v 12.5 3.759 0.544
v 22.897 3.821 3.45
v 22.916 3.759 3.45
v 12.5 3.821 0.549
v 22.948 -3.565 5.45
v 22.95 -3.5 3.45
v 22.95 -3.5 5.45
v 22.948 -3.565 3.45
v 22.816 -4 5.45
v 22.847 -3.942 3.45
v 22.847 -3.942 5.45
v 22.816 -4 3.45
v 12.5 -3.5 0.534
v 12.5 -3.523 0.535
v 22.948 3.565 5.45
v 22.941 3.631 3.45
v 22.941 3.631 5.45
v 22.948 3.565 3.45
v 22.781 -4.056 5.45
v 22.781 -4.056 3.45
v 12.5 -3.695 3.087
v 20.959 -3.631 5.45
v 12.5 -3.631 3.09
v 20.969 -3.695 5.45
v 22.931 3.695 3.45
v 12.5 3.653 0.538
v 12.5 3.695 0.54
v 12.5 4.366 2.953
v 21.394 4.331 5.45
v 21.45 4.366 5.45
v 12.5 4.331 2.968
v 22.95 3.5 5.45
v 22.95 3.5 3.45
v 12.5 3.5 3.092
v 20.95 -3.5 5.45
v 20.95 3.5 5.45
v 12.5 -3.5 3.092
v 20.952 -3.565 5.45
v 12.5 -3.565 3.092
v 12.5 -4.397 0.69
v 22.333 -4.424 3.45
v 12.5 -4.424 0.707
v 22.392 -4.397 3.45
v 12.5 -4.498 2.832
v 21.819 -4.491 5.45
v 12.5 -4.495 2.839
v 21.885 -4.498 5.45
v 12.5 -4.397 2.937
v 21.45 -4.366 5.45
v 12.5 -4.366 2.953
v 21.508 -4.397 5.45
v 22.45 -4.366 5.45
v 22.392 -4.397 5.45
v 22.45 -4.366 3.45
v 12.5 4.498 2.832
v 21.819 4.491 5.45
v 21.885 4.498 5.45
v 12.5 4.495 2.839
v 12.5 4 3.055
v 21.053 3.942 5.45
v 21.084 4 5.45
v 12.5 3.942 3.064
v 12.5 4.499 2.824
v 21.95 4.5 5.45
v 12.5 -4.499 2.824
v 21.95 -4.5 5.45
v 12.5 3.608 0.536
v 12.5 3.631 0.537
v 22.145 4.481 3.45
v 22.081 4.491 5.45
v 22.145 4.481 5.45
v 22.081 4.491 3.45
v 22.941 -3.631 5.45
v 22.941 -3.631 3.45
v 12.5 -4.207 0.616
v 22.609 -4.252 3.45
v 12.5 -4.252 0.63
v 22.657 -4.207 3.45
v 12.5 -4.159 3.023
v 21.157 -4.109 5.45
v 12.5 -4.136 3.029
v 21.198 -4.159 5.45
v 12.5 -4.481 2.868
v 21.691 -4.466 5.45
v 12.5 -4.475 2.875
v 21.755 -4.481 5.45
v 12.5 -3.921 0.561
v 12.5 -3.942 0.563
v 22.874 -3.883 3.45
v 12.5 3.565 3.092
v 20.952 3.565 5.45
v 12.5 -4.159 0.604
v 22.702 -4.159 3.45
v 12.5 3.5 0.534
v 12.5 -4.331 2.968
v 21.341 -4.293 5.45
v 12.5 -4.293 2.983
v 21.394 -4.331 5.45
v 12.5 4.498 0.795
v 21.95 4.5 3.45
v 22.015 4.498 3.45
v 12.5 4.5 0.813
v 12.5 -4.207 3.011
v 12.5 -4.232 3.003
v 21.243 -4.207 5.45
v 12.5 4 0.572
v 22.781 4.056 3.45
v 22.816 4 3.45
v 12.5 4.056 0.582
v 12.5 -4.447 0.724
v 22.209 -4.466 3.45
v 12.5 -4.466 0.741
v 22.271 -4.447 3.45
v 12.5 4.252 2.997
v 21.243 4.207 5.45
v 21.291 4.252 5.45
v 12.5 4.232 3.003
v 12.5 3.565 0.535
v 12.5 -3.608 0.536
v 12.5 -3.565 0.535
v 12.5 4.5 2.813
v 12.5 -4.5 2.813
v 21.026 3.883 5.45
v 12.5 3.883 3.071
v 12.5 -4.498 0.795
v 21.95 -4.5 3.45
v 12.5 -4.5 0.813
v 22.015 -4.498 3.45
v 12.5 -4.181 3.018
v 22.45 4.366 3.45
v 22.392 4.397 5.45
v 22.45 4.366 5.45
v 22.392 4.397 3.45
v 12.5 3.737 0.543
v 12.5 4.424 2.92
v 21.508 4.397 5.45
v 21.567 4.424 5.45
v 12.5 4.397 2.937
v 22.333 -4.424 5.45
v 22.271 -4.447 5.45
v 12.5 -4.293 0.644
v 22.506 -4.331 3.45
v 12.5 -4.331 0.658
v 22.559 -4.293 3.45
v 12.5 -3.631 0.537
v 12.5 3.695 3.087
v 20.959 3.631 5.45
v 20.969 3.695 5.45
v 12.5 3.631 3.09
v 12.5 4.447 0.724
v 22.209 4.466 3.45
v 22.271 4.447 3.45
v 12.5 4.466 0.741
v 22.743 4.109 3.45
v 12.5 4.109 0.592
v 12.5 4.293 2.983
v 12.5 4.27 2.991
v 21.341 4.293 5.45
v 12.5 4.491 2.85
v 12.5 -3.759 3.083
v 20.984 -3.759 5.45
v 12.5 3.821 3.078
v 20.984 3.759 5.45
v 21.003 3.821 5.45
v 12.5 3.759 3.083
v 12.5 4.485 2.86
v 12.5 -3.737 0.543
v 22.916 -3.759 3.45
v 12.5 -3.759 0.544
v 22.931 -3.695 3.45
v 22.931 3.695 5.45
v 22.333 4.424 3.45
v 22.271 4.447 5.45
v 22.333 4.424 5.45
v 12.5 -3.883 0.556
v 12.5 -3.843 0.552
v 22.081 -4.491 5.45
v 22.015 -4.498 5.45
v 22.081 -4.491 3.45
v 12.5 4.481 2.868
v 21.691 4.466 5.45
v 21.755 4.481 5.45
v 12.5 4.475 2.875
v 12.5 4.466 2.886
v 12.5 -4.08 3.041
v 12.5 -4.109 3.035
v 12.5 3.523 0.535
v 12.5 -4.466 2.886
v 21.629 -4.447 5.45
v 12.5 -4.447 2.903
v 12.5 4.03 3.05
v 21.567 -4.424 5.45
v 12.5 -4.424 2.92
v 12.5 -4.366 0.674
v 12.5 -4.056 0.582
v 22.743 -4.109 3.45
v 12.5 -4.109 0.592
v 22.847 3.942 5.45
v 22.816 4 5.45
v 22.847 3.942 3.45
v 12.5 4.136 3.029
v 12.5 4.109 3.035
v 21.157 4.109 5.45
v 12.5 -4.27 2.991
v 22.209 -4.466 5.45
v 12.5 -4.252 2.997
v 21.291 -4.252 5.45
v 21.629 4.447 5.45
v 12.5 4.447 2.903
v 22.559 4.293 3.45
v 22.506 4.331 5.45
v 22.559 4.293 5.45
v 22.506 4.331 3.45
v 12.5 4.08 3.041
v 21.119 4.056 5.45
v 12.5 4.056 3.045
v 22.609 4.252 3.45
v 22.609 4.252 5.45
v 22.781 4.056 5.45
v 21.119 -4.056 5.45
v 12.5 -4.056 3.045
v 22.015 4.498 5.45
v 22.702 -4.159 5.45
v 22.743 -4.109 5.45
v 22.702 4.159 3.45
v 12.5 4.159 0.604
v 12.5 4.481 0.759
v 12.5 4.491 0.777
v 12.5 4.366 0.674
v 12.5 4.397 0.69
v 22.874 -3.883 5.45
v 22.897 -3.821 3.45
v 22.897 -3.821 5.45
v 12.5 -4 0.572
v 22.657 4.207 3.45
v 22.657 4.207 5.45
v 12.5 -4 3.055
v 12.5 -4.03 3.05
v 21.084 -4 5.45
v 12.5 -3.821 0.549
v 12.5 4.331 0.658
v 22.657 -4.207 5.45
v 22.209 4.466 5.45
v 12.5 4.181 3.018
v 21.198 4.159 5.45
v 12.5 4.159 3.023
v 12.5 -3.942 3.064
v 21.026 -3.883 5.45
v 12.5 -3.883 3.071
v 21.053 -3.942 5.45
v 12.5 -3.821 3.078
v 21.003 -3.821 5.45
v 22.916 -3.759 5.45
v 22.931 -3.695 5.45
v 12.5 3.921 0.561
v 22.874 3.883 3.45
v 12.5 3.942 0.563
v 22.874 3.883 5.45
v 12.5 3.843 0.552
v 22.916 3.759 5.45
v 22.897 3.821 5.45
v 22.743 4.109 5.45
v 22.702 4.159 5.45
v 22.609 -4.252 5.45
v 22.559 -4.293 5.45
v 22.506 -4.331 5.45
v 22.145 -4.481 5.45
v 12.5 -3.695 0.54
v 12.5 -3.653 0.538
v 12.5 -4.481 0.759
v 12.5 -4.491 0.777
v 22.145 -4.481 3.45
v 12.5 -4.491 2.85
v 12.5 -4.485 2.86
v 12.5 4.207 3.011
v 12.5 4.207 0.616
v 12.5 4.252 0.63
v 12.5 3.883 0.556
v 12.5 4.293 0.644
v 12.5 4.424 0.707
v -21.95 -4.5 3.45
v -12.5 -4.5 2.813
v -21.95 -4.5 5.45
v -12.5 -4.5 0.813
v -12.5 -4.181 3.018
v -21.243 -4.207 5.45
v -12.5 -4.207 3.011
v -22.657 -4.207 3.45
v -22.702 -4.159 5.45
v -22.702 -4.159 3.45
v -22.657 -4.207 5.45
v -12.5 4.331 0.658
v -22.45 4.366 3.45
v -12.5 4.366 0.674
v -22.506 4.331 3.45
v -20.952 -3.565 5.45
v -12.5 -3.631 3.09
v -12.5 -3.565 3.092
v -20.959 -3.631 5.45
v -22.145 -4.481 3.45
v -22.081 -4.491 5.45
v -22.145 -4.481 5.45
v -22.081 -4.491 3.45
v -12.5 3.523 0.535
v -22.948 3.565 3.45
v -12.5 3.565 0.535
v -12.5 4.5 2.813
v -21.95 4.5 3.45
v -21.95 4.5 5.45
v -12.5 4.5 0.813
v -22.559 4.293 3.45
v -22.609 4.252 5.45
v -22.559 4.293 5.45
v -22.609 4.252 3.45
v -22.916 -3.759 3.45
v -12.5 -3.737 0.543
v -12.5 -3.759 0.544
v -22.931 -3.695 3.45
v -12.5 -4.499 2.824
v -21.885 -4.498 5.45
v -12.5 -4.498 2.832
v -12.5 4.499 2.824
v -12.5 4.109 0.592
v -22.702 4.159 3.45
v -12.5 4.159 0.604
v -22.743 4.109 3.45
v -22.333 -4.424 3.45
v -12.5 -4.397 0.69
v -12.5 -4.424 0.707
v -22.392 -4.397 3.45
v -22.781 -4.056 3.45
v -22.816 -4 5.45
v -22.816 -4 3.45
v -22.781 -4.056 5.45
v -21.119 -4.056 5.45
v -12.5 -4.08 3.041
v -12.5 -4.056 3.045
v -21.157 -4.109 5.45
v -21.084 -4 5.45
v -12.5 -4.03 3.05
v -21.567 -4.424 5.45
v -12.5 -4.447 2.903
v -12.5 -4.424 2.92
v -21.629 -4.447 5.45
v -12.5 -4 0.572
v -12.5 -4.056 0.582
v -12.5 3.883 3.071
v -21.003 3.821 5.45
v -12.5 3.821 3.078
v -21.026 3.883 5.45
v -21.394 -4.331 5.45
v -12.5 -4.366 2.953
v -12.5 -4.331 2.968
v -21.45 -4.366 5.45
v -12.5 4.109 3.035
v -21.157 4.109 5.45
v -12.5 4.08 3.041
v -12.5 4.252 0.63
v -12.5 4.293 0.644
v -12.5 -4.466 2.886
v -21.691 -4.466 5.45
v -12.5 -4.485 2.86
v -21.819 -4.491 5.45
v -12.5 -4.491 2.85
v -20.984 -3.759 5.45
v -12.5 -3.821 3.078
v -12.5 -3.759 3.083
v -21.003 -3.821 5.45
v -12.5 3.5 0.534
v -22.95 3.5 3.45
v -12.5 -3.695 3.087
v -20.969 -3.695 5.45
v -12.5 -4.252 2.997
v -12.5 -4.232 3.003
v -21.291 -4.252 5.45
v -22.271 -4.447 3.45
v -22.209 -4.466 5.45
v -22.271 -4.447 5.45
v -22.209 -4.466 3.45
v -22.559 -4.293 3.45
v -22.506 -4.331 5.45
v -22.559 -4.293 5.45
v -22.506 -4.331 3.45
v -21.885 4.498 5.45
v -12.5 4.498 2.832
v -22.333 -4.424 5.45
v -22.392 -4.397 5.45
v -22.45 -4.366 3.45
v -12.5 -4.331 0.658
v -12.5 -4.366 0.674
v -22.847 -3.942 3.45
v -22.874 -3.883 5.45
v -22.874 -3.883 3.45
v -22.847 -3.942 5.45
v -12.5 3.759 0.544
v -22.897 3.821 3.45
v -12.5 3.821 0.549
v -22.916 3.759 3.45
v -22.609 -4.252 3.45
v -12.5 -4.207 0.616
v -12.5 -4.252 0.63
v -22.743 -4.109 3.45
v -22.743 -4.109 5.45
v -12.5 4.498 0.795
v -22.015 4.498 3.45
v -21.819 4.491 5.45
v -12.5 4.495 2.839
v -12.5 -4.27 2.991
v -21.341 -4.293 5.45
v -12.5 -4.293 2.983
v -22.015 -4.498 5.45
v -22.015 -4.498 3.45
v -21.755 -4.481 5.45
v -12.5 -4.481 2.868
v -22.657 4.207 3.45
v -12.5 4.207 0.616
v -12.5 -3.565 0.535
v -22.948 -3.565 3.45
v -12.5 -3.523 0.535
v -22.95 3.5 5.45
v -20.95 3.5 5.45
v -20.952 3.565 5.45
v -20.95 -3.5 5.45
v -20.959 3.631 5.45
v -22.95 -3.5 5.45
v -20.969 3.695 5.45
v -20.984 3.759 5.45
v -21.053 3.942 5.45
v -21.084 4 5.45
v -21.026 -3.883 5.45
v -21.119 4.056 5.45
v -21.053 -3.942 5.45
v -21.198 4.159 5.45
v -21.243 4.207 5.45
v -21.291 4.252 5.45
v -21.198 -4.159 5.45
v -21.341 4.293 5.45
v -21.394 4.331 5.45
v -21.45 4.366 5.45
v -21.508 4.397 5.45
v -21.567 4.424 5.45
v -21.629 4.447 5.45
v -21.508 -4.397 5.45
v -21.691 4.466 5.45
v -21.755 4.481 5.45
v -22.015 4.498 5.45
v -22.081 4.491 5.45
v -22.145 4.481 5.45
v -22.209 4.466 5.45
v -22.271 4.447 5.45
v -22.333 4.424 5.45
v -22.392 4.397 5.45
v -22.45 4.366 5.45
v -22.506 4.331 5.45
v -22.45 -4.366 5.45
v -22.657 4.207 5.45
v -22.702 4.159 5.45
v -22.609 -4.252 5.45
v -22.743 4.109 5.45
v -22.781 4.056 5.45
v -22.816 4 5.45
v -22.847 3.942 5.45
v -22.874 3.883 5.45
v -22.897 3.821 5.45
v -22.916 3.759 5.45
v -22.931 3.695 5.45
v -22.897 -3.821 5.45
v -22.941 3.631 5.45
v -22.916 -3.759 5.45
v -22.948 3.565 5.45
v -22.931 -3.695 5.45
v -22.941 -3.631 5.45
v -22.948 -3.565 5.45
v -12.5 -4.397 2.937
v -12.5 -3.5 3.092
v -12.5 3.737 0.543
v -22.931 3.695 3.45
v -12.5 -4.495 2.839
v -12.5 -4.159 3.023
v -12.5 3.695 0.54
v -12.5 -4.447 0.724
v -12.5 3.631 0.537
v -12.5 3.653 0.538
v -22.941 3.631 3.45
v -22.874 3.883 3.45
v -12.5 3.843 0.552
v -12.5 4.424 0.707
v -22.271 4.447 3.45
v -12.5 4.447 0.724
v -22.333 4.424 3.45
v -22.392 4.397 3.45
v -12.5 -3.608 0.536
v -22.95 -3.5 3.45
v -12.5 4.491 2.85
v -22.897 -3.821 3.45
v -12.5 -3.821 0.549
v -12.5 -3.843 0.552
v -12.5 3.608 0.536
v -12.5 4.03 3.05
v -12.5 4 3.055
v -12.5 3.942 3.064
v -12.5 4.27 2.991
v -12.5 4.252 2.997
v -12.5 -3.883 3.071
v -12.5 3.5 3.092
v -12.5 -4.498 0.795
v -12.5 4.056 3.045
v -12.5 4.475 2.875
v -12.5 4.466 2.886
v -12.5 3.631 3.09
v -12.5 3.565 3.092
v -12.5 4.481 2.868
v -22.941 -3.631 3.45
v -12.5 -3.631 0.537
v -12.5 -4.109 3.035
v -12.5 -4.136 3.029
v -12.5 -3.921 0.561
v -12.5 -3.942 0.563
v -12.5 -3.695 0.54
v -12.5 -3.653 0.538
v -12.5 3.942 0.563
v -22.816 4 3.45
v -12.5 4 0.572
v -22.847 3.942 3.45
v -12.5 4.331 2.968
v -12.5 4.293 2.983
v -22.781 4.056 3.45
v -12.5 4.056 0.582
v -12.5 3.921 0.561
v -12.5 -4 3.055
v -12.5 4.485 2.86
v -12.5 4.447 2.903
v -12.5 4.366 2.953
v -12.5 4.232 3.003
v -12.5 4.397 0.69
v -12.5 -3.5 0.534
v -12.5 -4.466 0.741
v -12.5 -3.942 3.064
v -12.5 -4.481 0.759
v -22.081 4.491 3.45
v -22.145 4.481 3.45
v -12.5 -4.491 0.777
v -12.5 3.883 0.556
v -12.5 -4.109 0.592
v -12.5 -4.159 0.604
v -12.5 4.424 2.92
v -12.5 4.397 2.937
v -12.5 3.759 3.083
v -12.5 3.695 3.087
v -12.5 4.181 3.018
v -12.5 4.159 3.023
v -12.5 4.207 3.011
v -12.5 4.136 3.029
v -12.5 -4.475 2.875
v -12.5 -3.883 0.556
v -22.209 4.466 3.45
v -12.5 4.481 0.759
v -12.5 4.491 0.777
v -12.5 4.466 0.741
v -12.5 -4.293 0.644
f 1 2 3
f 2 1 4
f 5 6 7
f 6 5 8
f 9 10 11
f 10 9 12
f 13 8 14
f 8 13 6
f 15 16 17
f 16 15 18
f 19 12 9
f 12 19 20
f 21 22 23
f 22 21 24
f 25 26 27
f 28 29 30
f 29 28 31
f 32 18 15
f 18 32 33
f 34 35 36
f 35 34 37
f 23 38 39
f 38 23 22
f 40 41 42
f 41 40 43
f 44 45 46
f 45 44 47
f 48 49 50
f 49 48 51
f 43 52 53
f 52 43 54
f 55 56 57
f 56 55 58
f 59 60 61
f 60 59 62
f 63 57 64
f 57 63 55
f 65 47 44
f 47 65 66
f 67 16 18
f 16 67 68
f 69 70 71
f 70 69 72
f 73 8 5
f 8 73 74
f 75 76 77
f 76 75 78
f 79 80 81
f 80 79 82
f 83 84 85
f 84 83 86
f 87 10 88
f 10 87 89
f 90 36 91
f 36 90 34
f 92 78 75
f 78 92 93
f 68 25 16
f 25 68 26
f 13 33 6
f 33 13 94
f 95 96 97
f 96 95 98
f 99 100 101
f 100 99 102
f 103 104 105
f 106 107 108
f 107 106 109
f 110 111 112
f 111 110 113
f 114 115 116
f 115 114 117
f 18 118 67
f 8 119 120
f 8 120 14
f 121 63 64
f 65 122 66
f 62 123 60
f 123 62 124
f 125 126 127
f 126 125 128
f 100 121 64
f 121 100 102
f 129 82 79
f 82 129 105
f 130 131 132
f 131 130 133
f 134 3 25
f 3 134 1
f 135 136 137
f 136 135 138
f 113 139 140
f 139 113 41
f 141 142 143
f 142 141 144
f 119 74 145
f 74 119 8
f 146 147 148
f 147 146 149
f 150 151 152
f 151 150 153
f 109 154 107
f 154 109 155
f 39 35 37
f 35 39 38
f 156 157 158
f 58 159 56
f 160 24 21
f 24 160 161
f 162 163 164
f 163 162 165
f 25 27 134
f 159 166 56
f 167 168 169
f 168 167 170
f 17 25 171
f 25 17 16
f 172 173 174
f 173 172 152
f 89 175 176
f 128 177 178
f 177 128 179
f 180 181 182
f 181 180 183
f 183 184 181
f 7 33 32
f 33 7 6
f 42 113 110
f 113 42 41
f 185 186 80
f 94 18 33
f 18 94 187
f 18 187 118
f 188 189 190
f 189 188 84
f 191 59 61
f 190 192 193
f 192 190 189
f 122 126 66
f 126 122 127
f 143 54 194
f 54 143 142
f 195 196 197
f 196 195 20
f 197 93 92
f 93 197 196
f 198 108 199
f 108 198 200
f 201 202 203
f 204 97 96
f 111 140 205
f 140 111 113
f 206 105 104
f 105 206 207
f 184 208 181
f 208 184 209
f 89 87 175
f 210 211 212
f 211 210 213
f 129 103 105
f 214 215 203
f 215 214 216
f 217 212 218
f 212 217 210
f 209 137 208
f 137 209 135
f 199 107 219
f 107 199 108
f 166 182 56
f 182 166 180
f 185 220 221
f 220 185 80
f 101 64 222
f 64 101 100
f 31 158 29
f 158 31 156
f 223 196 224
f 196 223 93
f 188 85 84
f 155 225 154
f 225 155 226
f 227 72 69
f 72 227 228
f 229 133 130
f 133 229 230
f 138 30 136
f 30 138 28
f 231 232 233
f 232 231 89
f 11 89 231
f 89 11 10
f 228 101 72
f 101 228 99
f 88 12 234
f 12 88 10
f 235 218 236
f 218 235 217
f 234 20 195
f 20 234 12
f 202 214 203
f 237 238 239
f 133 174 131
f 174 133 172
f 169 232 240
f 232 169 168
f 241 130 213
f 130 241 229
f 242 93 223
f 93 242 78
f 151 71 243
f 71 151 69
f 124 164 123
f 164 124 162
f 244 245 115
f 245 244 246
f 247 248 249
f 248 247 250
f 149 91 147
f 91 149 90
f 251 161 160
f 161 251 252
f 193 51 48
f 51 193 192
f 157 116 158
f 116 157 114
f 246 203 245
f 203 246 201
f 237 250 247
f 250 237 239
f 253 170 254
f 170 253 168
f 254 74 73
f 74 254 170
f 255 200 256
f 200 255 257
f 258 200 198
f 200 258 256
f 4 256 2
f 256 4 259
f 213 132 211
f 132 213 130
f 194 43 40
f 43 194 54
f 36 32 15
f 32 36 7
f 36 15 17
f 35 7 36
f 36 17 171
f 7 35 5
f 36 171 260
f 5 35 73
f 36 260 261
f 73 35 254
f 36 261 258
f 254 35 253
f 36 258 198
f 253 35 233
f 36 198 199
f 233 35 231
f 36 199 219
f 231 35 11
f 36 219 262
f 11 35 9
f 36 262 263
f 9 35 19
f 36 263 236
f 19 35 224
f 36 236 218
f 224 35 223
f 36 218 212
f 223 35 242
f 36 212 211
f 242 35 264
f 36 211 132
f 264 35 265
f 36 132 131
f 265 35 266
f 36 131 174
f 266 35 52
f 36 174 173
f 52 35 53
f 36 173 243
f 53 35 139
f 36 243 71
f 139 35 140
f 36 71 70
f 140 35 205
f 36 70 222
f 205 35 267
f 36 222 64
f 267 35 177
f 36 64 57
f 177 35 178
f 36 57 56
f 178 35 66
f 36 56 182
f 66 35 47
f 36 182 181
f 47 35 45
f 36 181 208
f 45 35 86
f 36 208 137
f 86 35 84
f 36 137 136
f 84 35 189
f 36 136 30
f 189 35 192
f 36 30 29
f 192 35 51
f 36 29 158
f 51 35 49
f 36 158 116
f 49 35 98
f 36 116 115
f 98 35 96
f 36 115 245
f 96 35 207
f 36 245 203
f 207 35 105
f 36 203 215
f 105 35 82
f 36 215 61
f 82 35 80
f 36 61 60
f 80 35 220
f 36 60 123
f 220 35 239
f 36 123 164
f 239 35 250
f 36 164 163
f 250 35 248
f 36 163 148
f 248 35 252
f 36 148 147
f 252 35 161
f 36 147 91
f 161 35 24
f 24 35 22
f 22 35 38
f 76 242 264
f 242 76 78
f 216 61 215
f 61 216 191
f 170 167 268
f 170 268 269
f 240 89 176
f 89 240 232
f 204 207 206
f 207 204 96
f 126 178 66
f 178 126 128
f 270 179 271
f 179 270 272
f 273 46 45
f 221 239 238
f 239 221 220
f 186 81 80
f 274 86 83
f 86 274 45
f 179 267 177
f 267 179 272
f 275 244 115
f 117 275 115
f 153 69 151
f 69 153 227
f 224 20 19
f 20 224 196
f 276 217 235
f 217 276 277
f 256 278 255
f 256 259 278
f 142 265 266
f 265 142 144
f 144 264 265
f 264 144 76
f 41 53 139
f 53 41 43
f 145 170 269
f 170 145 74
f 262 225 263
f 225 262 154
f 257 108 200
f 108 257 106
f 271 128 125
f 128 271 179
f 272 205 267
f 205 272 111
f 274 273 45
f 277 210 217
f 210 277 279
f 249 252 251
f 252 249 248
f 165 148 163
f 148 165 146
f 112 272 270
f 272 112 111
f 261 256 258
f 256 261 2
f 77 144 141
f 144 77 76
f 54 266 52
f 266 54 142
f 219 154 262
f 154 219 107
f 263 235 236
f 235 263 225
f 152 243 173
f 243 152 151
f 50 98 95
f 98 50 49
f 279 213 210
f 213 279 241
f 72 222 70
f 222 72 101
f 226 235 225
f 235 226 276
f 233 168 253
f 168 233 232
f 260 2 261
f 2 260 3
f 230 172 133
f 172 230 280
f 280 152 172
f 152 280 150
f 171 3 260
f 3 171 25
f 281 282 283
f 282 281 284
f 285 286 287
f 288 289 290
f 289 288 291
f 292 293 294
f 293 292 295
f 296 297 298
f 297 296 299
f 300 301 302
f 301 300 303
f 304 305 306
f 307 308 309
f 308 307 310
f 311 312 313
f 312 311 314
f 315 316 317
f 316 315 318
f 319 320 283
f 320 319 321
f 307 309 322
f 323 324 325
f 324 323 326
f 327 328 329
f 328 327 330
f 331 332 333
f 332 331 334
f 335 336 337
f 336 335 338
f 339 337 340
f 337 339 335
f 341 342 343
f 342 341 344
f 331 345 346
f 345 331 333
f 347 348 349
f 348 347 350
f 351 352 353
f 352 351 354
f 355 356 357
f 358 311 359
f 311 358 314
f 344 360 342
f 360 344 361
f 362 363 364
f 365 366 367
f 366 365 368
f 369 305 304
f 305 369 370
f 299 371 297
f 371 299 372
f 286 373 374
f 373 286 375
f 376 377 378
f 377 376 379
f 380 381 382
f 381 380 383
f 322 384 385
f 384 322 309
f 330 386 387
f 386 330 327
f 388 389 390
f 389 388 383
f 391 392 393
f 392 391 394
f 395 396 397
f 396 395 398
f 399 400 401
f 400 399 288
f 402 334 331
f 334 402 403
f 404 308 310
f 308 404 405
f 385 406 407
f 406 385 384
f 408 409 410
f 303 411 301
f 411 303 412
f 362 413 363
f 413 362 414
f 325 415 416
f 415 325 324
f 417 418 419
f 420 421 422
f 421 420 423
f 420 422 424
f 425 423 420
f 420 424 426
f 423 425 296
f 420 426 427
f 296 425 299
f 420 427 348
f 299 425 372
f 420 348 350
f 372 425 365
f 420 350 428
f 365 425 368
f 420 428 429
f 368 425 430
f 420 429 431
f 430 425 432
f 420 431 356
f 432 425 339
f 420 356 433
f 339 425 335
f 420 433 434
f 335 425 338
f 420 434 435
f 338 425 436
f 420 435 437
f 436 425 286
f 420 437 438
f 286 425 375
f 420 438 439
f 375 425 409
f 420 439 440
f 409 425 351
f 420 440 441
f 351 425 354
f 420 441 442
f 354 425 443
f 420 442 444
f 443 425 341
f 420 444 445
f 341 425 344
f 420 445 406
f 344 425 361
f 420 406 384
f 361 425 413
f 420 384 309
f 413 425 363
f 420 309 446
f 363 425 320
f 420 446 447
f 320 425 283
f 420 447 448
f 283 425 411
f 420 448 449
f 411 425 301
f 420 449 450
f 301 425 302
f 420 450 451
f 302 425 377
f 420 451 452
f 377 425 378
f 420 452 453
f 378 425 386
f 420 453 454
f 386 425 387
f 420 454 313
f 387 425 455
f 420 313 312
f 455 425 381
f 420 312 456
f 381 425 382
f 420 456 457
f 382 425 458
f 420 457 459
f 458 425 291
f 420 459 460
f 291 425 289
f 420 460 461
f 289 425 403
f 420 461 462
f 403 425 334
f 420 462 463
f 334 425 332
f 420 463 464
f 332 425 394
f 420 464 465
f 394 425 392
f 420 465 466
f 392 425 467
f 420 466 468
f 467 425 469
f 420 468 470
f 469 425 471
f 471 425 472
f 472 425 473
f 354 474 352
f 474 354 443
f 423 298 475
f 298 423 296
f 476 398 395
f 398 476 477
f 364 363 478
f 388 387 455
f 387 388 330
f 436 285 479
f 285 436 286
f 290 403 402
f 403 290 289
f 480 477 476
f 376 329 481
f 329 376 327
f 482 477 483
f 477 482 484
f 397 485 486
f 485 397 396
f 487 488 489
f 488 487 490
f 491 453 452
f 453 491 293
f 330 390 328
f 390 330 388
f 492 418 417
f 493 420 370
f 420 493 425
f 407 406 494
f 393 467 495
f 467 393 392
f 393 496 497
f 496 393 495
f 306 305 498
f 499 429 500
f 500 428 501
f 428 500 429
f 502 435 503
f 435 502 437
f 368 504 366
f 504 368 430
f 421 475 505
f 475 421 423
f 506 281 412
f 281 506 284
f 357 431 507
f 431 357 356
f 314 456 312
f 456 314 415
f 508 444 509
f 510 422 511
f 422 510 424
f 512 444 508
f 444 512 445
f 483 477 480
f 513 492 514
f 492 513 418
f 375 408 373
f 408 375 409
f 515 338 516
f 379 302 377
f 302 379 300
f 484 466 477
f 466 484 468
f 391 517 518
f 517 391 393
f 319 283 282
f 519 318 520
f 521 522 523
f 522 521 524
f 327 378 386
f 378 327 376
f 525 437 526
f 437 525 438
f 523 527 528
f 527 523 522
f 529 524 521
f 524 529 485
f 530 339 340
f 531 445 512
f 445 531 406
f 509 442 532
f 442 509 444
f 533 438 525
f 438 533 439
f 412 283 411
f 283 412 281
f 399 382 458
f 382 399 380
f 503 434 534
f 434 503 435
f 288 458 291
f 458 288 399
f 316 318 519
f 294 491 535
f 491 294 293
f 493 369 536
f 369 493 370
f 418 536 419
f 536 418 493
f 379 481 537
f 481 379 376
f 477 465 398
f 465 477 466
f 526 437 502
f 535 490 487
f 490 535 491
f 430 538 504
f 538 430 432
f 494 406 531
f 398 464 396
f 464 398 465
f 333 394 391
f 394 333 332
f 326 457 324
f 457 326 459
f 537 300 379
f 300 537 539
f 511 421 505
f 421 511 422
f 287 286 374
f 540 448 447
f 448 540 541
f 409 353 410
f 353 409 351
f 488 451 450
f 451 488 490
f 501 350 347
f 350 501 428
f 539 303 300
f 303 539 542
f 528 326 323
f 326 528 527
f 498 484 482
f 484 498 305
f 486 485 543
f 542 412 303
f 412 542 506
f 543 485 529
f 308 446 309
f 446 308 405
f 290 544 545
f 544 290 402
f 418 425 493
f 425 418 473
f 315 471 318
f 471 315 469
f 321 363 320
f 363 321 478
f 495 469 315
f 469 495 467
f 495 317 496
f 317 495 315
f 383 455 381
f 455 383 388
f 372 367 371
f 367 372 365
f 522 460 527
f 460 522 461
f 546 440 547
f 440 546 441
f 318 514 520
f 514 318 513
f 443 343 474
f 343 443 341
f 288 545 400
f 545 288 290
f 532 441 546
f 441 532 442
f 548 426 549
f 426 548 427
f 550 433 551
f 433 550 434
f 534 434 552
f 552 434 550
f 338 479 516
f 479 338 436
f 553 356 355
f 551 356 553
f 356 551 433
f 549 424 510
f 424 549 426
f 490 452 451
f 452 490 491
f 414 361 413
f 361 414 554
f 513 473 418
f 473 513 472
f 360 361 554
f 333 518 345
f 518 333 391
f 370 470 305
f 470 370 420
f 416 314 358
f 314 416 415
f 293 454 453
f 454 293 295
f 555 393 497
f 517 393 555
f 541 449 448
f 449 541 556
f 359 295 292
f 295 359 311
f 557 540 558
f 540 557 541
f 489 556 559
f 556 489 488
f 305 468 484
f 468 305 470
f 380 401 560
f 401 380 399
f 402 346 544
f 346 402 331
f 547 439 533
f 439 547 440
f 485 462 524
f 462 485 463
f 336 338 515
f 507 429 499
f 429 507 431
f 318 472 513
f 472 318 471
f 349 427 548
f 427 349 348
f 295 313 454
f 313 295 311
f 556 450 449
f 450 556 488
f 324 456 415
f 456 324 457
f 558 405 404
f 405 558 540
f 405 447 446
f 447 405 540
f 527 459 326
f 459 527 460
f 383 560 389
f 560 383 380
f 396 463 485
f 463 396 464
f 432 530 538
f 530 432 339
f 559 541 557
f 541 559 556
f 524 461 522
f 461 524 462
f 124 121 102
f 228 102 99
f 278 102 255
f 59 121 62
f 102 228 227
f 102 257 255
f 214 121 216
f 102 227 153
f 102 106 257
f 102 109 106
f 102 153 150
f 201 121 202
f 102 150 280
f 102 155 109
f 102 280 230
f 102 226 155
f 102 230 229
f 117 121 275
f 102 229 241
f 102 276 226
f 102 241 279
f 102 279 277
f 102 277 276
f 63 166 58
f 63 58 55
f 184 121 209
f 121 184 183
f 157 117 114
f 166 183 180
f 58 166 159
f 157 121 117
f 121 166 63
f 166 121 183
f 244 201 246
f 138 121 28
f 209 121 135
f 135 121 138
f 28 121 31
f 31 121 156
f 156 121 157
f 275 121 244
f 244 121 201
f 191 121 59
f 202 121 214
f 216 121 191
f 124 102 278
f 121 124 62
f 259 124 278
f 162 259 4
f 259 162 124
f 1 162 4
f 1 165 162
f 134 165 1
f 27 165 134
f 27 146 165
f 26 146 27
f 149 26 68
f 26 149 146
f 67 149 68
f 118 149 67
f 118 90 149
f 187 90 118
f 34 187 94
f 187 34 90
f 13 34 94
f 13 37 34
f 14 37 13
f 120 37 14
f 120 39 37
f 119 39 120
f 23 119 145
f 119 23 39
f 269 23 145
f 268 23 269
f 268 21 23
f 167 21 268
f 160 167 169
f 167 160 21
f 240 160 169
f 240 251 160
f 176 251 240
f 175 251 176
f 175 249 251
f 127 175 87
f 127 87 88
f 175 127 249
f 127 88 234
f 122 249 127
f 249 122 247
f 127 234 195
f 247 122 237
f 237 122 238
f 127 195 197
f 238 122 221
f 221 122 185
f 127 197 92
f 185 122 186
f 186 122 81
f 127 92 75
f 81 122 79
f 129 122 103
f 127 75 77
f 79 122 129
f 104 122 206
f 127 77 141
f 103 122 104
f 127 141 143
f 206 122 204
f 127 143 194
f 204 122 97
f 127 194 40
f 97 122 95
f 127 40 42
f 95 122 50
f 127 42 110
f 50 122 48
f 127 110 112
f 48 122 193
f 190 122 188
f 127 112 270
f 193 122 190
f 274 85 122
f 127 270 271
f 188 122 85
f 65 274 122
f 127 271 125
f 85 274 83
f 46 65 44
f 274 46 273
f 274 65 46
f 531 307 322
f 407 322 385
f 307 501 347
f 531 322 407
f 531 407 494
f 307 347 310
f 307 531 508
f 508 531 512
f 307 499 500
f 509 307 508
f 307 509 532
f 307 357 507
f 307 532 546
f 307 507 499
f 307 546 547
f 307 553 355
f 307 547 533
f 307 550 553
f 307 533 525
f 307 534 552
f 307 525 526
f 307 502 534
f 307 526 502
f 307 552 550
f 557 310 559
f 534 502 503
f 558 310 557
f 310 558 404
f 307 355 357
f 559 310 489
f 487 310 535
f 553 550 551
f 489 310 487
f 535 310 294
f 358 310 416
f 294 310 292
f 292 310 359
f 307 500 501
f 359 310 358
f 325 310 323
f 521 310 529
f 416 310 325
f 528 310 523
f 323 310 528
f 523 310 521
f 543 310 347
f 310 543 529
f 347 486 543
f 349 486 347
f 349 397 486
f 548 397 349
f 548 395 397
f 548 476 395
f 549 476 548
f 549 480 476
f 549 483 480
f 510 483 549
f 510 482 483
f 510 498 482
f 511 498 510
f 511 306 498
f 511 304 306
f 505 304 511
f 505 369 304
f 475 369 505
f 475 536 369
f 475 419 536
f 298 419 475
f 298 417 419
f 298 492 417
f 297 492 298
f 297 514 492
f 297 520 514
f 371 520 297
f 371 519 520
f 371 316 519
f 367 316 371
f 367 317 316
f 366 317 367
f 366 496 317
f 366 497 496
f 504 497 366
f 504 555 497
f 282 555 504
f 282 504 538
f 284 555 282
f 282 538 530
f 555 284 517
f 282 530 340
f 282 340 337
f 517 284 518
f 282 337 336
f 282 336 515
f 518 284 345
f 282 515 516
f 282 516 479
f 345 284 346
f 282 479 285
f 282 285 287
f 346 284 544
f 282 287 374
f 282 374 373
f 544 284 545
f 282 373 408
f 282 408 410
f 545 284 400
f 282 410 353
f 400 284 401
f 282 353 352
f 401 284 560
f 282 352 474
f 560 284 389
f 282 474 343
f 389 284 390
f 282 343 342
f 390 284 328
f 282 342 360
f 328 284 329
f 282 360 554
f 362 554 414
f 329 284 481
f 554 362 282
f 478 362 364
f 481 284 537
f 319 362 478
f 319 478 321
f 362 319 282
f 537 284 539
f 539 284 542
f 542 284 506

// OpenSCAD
$fn=96;

L = 43.9;
W = 11.0;
H = 10.9;

t = 2.0;                 // constant thickness (Z)
pad_len = 12.0;          // central pad length along X
arm_len = (L - pad_len)/2;

arm_w = 9.0;             // arm width in Y
pad_w = 11.0;            // pad width in Y

arm_rise = (H - t)/2;    // Z rise from pad to arm ends
fillet_r = 6.0;          // large concave/filleted transition radius

module rounded_rect_2d(len, wid, r){
    r2 = min(r, min(len, wid)/2);
    hull(){
        translate([ len/2 - r2,  wid/2 - r2]) circle(r=r2);
        translate([-len/2 + r2,  wid/2 - r2]) circle(r=r2);
        translate([ len/2 - r2, -wid/2 + r2]) circle(r=r2);
        translate([-len/2 + r2, -wid/2 + r2]) circle(r=r2);
    }
}

module slab(len, wid, thick, r=1.0){
    linear_extrude(height=thick, center=true)
        rounded_rect_2d(len, wid, r);
}

module arm(sign=1){
    x0 = sign*(pad_len/2);
    x1 = sign*(L/2);
    z0 = 0;
    z1 = arm_rise;

    hull(){
        translate([x0, 0, z0]) slab(2.0, arm_w, t, r=1.0);
        translate([x1, 0, z1]) slab(2.0, arm_w, t, r=1.0);
    }
}

module pad(){
    slab(pad_len, pad_w, t, r=1.2);
}

module concave_fillet(sign=1){
    xj = sign*(pad_len/2);
    translate([xj, 0, 0])
        rotate([0, 90, 0])
            cylinder(r=fillet_r, h=W+2, center=true);
}

difference(){
    union(){
        pad();
        arm(1);
        arm(-1);
    }
    concave_fillet(1);
    concave_fillet(-1);
}
